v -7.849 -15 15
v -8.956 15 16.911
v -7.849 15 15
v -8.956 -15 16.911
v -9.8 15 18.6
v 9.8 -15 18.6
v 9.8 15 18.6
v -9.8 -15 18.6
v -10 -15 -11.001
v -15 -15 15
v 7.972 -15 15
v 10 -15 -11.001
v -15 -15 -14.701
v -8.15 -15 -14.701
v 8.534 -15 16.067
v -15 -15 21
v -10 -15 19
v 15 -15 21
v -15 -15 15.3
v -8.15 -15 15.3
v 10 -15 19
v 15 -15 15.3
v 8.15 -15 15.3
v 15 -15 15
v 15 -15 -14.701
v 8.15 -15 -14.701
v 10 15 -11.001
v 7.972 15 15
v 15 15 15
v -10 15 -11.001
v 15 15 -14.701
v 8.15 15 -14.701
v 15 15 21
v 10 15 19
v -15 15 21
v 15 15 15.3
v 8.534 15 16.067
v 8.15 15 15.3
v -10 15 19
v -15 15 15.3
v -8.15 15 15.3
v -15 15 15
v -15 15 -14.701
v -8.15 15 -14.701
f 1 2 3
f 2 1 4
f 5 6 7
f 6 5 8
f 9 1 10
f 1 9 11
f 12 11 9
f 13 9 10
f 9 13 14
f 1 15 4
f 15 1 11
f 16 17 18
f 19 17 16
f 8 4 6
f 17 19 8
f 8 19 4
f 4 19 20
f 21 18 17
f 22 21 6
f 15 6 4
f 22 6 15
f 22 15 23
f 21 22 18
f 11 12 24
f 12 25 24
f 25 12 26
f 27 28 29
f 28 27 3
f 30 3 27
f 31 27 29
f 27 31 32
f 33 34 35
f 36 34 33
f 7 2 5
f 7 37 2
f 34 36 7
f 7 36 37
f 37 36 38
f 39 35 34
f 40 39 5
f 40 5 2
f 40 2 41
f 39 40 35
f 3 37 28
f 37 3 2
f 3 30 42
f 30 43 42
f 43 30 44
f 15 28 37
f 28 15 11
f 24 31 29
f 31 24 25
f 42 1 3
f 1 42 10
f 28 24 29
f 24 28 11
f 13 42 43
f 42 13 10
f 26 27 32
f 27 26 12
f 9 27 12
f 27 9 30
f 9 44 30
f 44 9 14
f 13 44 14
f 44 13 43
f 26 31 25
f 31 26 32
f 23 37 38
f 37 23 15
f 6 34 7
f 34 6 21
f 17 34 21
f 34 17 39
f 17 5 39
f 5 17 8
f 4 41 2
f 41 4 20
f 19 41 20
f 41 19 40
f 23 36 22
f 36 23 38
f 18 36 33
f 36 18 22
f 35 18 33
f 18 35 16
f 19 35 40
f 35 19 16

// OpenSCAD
// file: lib/dovetail.scad
/**
 * dovetail.scad
 * A dovetail generator to easily lock modular pieces together.
 *
 * @author Nathan Campos <nathan@innoveworkshop.com>
 */

eps = 0.001;

/**
 * Creates a 2D trapezoid with a shrinking tolerance factor.
 *
 * @param w   Major width of the trapezoid.
 * @param h   Height of the trapezoid.
 * @param a   Side angle of the trapezoid.
 * @param tol Absolute amount to shrink the part as a whole.
 */
module trapezoid(w, h = 4, a = 2, tol = 0.4) {
	function at(val, t) = val + (tol / 2);
	function st(val, t) = val - (tol / 2);
	
	translate([st(-(w / 2)), st(-(h / 2)), 0])
		polygon(points = [[at(a), 0], [0, st(h)], [st(w), st(h)],
			[st(w - a), 0]]);
}

/**
 * Creates a male or female dovetail joint.
 *
 * @param gender Dovetail gender. ("male" or "female")
 * @param w      Width of the mating face.
 * @param d      Depth of the mating face.
 * @param sm     Margin from the side of the mating face to the end of the
 *               dovetail joint.
 * @param th     Dovetail trapezoid height.
 * @param ta     Side angle of the dovetail trapezoid.
 * @param tol    Absolute tolerance of the fit.
 */
module dovetail(gender, w, d, sm = 5, th = 4, ta = 2, tol = 0.4) {
	dt_eps = 0.001;

	if (gender == "male") {
		// Male Dovetail.
		translate([tol / 1.5, d / 2, th / 2])
		rotate([90, 0, 0])
		linear_extrude(d)
			trapezoid(w - (sm * 2), th, ta, tol);
	} else if (gender == "female") {
		union() {
			// Female dovetail.
			translate([0, (d / 2) + (dt_eps / 2), th / 2])
			rotate([90, 0, 0])
			linear_extrude(d + dt_eps)
				trapezoid(w - (sm * 2), th, ta, 0);
			
			// Tolerance of the fit. Removes a bit of height from the
			// mating surface.
			cube([w + dt_eps, d + dt_eps, tol + 0.2 + dt_eps], center = true);
		}
	} else {
		// Unknown gender.
		assert(false, "Unknown dovetail gender");
	}
}

/**
 * Creates a cap for a male dovetail to cover the last object in a modular
 * system.
 *
 * @param w Dovetail surface width.
 * @param d Dovetail surface depth.
 * @param h Cap height.
 */
module dovetail_cap(w, d, h) {
	difference() {
		cube([w, d, h], center = true);
	
		translate([0, 0, -h / 2])
			dovetail("female", w, d);
	}
}
// main file
/**
 * dovetail-test.scad
 * A test of locking modular things together.
 *
 * @author Nathan Campos <nathan@innoveworkshop.com>
 */

use <lib/dovetail.scad>

eps = 0.001;

difference() {
	union() {
		color("red")
		translate([0, 0, 15])
			dovetail("male", 30, 30);

		cube([30, 30, 30], center = true);
	}

	color("red")
	translate([0, 0, -15 - eps])
		dovetail("female", 30, 30);
}

#color("teal")
translate([0, 0, 15 + 3])
	dovetail_cap(30, 30, 6);
